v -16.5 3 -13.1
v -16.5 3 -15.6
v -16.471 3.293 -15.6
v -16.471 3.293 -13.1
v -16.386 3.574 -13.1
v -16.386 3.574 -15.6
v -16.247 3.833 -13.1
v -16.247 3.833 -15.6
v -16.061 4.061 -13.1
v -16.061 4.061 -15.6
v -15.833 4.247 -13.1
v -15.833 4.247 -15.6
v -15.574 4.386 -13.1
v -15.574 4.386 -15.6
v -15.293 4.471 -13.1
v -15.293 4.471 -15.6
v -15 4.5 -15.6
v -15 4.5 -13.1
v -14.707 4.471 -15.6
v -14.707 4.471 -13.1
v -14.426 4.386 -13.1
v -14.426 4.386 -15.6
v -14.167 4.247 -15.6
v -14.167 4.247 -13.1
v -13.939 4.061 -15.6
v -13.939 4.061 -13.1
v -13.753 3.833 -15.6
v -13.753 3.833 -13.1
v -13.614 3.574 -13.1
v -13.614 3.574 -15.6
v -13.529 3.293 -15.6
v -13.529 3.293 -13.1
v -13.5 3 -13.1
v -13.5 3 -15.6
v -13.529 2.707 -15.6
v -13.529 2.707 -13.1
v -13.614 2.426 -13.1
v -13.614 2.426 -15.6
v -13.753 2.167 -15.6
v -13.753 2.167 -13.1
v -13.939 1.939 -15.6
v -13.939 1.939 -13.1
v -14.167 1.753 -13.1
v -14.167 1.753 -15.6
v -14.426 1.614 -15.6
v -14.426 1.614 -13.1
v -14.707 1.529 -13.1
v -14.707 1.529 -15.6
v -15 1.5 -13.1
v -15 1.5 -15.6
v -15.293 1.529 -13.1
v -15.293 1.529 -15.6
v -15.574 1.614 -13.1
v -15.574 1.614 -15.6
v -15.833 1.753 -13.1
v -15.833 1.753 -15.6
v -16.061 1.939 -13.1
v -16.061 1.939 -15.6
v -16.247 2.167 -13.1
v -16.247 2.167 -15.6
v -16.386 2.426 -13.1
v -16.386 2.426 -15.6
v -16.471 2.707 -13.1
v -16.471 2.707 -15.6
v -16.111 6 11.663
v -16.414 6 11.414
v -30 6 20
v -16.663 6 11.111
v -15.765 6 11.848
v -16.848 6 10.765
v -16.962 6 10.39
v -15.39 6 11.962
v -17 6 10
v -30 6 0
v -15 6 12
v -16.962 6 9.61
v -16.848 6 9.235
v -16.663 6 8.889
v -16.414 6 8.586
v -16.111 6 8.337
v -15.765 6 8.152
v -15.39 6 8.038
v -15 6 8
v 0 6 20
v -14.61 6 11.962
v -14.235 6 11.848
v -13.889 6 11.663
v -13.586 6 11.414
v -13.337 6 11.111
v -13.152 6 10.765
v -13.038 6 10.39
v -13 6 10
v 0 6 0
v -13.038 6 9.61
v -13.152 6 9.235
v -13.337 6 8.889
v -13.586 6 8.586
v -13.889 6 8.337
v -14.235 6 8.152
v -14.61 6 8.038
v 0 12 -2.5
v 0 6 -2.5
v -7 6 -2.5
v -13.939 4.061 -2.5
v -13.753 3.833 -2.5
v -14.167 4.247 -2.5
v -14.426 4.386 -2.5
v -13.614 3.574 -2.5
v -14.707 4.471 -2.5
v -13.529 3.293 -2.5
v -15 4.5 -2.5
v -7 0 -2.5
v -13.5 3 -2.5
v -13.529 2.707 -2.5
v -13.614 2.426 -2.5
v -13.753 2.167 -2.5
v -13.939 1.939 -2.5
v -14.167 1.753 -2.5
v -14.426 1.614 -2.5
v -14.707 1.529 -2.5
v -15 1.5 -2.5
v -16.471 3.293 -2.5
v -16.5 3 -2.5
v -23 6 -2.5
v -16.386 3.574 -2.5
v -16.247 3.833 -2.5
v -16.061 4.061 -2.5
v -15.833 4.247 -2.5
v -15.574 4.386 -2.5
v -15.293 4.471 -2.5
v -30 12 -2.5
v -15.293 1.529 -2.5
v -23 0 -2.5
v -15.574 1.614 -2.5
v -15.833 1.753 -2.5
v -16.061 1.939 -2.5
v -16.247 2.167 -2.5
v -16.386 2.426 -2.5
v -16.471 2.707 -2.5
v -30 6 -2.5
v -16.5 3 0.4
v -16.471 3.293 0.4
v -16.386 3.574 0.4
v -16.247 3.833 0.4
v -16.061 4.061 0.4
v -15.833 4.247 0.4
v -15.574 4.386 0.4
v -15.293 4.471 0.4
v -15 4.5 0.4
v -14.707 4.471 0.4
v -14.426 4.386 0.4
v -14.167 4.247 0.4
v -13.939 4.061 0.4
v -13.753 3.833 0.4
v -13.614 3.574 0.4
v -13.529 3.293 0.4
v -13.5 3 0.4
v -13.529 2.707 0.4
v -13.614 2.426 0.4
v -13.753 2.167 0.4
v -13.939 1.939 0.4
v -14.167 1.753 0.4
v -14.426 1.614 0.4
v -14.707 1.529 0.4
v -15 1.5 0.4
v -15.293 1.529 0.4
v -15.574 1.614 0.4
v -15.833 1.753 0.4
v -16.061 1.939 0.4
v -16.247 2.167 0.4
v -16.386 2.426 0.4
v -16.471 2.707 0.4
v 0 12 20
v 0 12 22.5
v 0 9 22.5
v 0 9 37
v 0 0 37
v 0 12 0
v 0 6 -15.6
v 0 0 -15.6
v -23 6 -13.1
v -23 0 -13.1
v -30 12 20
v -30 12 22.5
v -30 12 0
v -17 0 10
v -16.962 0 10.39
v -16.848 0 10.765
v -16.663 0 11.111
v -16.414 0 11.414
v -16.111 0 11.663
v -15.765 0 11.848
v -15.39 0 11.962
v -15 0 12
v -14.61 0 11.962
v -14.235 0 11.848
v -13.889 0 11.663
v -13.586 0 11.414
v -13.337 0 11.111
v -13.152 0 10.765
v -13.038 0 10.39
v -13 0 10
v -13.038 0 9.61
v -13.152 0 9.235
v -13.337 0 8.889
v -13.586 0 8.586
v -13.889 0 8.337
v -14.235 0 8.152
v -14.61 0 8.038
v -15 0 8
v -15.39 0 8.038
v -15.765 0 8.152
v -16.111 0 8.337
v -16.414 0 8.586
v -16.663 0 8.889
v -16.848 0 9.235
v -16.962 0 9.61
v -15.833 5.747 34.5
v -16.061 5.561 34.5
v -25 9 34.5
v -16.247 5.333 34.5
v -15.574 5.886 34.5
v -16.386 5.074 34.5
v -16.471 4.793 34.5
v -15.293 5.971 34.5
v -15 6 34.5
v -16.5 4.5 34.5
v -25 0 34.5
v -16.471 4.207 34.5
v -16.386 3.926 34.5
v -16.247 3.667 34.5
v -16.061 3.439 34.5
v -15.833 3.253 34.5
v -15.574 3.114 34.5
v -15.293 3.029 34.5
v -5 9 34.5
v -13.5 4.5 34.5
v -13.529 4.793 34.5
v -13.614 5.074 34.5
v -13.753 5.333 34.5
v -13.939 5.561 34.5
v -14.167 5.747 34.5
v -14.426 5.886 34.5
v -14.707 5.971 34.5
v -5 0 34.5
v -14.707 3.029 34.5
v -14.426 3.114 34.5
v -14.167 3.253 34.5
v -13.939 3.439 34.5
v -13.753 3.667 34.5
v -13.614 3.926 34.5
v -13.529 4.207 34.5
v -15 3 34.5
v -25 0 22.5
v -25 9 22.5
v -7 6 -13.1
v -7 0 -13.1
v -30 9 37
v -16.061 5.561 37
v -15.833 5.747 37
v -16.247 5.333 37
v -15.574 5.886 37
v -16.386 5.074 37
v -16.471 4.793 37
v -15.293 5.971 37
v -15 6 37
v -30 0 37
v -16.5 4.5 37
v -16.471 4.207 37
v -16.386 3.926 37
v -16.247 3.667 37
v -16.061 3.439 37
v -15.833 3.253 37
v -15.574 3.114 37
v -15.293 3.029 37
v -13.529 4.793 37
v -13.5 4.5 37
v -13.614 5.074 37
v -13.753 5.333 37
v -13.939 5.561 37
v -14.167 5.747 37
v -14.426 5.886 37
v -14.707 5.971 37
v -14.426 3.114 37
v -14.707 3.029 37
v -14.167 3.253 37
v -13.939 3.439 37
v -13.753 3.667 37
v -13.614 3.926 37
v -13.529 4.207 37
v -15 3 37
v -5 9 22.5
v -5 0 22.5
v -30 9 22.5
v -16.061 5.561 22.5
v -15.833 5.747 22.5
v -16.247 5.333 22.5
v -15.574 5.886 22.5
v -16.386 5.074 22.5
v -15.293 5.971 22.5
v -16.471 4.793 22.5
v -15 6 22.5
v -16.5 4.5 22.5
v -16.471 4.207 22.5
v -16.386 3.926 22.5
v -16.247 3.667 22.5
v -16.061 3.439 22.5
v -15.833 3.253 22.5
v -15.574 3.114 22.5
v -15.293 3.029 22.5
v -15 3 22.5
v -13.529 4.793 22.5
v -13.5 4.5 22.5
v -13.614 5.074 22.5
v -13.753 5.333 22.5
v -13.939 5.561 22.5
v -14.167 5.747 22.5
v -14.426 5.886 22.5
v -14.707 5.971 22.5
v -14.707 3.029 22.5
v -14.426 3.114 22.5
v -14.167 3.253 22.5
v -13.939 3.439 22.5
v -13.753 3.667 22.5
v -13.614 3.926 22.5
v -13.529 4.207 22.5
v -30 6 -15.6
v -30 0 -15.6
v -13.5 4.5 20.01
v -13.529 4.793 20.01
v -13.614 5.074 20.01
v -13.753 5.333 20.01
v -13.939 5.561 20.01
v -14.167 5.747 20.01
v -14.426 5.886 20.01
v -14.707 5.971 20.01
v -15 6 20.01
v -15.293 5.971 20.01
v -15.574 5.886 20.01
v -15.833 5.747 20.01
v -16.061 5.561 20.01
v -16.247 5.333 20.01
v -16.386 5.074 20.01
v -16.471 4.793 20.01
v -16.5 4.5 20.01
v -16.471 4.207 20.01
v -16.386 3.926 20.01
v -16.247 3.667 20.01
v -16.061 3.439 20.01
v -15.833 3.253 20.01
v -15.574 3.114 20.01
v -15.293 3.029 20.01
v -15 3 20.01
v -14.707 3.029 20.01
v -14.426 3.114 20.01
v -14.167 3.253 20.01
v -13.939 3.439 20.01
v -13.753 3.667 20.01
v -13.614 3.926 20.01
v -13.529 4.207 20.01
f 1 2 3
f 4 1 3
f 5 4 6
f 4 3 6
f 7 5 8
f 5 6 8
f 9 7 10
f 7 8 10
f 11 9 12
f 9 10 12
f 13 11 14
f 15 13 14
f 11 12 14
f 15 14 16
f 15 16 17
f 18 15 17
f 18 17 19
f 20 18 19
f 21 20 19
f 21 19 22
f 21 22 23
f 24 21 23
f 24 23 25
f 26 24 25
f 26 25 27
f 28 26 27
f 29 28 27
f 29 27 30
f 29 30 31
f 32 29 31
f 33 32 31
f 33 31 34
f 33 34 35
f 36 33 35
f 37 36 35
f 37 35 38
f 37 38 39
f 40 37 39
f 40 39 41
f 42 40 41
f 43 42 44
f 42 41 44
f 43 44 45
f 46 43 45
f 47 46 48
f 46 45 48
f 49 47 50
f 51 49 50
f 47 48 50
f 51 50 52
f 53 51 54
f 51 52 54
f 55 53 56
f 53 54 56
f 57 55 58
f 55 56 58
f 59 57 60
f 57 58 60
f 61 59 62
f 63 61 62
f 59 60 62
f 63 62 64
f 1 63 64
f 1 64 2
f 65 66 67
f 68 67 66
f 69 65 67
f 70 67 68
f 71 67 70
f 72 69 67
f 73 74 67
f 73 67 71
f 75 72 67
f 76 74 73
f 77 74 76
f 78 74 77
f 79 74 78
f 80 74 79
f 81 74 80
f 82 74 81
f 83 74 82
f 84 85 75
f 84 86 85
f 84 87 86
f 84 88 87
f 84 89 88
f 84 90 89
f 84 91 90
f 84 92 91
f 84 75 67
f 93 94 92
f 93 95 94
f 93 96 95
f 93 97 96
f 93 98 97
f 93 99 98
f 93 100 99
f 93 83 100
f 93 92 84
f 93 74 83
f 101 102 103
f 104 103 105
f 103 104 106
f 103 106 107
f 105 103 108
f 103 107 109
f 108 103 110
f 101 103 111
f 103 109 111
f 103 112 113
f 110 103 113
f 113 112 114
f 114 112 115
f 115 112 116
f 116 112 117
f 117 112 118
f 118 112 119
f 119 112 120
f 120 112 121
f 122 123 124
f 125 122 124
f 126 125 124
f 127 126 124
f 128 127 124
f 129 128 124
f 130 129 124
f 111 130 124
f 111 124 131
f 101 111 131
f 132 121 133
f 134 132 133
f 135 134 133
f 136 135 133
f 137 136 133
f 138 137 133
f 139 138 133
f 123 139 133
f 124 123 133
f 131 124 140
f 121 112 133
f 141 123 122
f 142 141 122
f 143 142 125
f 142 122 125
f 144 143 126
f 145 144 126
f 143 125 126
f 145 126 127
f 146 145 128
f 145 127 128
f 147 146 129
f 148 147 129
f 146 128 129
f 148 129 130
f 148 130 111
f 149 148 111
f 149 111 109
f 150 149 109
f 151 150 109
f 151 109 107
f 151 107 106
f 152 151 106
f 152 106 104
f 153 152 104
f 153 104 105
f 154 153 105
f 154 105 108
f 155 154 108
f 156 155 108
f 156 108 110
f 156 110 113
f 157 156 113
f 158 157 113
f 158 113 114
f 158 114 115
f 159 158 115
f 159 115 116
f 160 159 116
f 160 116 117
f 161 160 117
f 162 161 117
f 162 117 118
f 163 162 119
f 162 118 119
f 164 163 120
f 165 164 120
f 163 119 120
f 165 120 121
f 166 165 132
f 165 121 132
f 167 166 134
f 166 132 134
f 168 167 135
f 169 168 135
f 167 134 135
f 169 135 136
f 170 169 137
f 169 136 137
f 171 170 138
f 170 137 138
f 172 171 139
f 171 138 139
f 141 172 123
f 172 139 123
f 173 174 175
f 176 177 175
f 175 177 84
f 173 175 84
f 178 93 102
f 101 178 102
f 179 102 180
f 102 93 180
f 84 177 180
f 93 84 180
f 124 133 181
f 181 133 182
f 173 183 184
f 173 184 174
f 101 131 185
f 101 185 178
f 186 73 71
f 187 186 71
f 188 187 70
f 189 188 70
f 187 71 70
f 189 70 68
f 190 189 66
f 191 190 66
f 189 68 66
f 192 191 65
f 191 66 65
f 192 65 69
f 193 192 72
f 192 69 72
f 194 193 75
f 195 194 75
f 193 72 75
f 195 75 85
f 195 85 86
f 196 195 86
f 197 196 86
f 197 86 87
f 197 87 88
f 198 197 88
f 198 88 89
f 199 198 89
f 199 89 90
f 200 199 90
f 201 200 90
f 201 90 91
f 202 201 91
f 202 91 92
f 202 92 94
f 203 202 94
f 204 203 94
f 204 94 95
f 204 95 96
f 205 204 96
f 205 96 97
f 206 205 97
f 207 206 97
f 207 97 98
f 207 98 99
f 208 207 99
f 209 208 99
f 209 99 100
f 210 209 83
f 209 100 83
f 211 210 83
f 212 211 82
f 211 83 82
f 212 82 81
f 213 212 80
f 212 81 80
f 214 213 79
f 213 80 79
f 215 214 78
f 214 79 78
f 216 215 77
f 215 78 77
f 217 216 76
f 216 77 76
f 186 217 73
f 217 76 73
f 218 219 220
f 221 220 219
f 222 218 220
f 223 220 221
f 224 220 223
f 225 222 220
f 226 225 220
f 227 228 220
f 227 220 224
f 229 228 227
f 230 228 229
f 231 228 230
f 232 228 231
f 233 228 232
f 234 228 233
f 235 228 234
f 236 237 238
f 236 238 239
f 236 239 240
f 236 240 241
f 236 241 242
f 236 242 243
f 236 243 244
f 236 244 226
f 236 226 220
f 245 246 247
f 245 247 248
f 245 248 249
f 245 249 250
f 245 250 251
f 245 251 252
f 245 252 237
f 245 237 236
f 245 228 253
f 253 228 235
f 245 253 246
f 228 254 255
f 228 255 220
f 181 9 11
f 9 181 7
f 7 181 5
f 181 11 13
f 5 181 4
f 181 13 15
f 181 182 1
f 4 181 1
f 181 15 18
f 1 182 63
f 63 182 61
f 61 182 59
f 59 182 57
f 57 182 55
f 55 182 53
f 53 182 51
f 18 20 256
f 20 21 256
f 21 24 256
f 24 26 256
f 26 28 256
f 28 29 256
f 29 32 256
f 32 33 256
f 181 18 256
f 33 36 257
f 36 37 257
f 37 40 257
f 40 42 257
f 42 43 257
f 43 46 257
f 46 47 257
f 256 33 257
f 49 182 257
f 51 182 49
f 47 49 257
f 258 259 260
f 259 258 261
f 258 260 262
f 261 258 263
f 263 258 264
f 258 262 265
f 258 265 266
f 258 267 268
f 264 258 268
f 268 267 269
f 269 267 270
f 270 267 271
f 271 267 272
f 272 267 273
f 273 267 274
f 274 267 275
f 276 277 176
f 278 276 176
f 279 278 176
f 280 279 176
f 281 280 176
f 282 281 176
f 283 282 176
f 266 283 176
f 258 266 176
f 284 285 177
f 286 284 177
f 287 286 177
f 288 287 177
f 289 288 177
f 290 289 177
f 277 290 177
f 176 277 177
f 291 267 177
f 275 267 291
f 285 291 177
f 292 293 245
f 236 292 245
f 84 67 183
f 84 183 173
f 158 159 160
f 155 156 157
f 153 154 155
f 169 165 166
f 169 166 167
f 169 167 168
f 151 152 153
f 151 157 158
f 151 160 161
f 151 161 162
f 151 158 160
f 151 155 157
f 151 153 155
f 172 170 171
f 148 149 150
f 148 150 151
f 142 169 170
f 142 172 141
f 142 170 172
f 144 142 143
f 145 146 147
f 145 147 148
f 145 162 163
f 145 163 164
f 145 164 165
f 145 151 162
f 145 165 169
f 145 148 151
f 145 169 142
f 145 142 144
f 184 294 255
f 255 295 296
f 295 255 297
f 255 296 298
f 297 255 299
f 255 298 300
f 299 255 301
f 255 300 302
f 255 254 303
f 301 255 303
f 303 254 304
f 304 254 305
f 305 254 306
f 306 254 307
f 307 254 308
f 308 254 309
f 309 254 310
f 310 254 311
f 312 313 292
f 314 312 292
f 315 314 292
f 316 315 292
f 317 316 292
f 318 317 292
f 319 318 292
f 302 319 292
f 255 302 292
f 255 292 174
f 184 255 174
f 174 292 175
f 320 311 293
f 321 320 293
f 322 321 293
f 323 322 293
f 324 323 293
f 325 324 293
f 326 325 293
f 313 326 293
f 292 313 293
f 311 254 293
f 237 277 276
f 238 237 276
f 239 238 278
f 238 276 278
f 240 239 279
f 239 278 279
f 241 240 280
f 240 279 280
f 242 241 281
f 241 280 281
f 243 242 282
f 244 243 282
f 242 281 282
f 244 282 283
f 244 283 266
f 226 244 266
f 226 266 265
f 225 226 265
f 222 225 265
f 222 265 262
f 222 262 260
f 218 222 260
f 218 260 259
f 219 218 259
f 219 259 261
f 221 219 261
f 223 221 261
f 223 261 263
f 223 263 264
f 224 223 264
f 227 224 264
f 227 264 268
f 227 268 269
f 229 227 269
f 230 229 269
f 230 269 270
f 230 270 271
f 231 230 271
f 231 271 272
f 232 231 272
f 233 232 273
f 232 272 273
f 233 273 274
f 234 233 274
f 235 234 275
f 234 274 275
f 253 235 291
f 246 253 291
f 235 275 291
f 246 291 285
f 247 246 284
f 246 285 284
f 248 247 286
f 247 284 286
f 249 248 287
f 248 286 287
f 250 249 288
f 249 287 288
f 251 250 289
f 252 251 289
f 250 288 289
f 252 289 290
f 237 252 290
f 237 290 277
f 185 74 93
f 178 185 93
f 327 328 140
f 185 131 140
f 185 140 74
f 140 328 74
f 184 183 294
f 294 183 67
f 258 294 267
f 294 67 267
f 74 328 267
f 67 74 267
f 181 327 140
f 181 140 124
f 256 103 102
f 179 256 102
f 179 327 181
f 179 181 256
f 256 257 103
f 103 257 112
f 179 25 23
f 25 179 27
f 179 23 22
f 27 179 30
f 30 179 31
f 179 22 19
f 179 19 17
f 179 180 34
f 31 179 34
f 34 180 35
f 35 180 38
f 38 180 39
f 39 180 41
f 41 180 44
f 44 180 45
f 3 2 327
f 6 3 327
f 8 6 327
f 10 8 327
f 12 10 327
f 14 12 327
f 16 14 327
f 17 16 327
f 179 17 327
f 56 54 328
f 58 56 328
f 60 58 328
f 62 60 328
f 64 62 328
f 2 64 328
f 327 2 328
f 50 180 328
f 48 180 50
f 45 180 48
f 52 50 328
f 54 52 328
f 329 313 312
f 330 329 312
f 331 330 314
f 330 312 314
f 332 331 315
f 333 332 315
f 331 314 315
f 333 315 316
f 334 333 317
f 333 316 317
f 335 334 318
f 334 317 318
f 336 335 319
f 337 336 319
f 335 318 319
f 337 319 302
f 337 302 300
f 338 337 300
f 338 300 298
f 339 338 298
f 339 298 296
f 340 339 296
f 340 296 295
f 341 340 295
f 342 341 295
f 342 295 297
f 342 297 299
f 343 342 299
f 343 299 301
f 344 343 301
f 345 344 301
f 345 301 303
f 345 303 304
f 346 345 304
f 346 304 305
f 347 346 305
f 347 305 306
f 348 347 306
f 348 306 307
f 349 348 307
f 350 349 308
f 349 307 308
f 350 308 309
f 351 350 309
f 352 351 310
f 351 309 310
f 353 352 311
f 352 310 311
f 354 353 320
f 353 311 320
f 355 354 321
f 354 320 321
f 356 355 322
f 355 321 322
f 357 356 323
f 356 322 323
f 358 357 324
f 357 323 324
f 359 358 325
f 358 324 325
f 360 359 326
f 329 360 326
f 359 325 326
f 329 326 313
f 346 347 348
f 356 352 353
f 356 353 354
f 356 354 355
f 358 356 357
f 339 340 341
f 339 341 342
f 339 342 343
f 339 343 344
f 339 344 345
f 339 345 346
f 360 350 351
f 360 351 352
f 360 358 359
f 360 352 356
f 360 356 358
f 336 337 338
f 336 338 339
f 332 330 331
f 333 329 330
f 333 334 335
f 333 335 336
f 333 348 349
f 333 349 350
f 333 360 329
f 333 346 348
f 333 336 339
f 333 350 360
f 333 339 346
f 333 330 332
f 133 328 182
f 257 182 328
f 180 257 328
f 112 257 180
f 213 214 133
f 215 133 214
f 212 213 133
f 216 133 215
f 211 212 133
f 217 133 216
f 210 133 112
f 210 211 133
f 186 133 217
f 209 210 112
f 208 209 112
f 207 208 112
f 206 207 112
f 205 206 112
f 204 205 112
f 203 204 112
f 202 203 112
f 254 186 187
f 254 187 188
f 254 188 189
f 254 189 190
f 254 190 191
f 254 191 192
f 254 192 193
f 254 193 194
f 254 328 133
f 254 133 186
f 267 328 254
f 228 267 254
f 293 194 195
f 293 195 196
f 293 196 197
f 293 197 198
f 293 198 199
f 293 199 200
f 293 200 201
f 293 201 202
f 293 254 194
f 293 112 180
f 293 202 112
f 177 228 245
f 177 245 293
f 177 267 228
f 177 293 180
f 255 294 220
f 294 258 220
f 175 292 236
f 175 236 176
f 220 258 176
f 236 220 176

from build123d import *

# Parameters (mm, degrees)
SKETCH1_W           = 30
SKETCH1_H           = 38.1
SKETCH1_W_2         = 16
SKETCH1_H_2         = 10.6
BOSS_EXTRUDE1_DEPTH = 6
SKETCH1_3_W         = 30
SKETCH1_3_H         = 2.5
BOSS_EXTRUDE2_DEPTH = 12
SKETCH3_R           = 1.5
CUT_EXTRUDE2_DEPTH  = 16
SKETCH2_R           = 2
CUT_EXTRUDE1_DEPTH  = 38.976966704
BOSS_EXTRUDE3_DEPTH = 9
SKETCH6_R           = 1.5
CUT_EXTRUDE4_DEPTH  = 16.99


with BuildPart() as part:
    # Sketch1 → Boss-Extrude1 (new body)
    with BuildSketch(Plane(origin=(0, 0, 0), x_dir=(1, 0, 0), z_dir=(0, 1, 0))):
        with Locations((-15, -3.45)):
            Rectangle(SKETCH1_W, SKETCH1_H)
        with Locations((-15, 7.8)):
            Rectangle(SKETCH1_W_2, SKETCH1_H_2, mode=Mode.SUBTRACT)
    extrude(amount=BOSS_EXTRUDE1_DEPTH)

    # Sketch1<3> → Boss-Extrude2 (add)
    with BuildSketch(Plane(origin=(0, 0, 0), x_dir=(1, 0, 0), z_dir=(0, 1, 0))):
        with Locations((-15, -21.25)):
            Rectangle(SKETCH1_3_W, SKETCH1_3_H)
        with Locations((-15, 1.25)):
            Rectangle(SKETCH1_3_W, SKETCH1_3_H)
    extrude(amount=BOSS_EXTRUDE2_DEPTH)

    # Sketch3 → Cut-Extrude2 (cut)
    with BuildSketch(Plane(origin=(0, 0, -15.6), x_dir=(-1, 0, 0), z_dir=(0, 0, -1))):
        with Locations((15, 3)):
            Circle(SKETCH3_R)
    extrude(amount=-CUT_EXTRUDE2_DEPTH, mode=Mode.SUBTRACT)

    # Sketch2 → Cut-Extrude1 (cut, through all)
    with BuildSketch(Plane(origin=(0, 6, 0), x_dir=(1, 0, 0), z_dir=(0, 1, 0))):
        with Locations((-15, -10)):
            Circle(SKETCH2_R)
    extrude(amount=-CUT_EXTRUDE1_DEPTH, mode=Mode.SUBTRACT)

    # Sketch5 → Boss-Extrude3 (add)
    with BuildSketch(Plane.XZ):
        Polygon((-30, 22.5), (-25, 22.5), (-25, 34.5), (-5, 34.5), (-5, 22.5), (0, 22.5), (0, 37), (-30, 37), align=None)
    extrude(amount=-BOSS_EXTRUDE3_DEPTH)

    # Sketch6 → Cut-Extrude4 (cut)
    with BuildSketch(Plane.XY.offset(37)):
        with Locations((-15, 4.5)):
            Circle(SKETCH6_R)
    extrude(amount=-CUT_EXTRUDE4_DEPTH, mode=Mode.SUBTRACT)


solid = part.part
